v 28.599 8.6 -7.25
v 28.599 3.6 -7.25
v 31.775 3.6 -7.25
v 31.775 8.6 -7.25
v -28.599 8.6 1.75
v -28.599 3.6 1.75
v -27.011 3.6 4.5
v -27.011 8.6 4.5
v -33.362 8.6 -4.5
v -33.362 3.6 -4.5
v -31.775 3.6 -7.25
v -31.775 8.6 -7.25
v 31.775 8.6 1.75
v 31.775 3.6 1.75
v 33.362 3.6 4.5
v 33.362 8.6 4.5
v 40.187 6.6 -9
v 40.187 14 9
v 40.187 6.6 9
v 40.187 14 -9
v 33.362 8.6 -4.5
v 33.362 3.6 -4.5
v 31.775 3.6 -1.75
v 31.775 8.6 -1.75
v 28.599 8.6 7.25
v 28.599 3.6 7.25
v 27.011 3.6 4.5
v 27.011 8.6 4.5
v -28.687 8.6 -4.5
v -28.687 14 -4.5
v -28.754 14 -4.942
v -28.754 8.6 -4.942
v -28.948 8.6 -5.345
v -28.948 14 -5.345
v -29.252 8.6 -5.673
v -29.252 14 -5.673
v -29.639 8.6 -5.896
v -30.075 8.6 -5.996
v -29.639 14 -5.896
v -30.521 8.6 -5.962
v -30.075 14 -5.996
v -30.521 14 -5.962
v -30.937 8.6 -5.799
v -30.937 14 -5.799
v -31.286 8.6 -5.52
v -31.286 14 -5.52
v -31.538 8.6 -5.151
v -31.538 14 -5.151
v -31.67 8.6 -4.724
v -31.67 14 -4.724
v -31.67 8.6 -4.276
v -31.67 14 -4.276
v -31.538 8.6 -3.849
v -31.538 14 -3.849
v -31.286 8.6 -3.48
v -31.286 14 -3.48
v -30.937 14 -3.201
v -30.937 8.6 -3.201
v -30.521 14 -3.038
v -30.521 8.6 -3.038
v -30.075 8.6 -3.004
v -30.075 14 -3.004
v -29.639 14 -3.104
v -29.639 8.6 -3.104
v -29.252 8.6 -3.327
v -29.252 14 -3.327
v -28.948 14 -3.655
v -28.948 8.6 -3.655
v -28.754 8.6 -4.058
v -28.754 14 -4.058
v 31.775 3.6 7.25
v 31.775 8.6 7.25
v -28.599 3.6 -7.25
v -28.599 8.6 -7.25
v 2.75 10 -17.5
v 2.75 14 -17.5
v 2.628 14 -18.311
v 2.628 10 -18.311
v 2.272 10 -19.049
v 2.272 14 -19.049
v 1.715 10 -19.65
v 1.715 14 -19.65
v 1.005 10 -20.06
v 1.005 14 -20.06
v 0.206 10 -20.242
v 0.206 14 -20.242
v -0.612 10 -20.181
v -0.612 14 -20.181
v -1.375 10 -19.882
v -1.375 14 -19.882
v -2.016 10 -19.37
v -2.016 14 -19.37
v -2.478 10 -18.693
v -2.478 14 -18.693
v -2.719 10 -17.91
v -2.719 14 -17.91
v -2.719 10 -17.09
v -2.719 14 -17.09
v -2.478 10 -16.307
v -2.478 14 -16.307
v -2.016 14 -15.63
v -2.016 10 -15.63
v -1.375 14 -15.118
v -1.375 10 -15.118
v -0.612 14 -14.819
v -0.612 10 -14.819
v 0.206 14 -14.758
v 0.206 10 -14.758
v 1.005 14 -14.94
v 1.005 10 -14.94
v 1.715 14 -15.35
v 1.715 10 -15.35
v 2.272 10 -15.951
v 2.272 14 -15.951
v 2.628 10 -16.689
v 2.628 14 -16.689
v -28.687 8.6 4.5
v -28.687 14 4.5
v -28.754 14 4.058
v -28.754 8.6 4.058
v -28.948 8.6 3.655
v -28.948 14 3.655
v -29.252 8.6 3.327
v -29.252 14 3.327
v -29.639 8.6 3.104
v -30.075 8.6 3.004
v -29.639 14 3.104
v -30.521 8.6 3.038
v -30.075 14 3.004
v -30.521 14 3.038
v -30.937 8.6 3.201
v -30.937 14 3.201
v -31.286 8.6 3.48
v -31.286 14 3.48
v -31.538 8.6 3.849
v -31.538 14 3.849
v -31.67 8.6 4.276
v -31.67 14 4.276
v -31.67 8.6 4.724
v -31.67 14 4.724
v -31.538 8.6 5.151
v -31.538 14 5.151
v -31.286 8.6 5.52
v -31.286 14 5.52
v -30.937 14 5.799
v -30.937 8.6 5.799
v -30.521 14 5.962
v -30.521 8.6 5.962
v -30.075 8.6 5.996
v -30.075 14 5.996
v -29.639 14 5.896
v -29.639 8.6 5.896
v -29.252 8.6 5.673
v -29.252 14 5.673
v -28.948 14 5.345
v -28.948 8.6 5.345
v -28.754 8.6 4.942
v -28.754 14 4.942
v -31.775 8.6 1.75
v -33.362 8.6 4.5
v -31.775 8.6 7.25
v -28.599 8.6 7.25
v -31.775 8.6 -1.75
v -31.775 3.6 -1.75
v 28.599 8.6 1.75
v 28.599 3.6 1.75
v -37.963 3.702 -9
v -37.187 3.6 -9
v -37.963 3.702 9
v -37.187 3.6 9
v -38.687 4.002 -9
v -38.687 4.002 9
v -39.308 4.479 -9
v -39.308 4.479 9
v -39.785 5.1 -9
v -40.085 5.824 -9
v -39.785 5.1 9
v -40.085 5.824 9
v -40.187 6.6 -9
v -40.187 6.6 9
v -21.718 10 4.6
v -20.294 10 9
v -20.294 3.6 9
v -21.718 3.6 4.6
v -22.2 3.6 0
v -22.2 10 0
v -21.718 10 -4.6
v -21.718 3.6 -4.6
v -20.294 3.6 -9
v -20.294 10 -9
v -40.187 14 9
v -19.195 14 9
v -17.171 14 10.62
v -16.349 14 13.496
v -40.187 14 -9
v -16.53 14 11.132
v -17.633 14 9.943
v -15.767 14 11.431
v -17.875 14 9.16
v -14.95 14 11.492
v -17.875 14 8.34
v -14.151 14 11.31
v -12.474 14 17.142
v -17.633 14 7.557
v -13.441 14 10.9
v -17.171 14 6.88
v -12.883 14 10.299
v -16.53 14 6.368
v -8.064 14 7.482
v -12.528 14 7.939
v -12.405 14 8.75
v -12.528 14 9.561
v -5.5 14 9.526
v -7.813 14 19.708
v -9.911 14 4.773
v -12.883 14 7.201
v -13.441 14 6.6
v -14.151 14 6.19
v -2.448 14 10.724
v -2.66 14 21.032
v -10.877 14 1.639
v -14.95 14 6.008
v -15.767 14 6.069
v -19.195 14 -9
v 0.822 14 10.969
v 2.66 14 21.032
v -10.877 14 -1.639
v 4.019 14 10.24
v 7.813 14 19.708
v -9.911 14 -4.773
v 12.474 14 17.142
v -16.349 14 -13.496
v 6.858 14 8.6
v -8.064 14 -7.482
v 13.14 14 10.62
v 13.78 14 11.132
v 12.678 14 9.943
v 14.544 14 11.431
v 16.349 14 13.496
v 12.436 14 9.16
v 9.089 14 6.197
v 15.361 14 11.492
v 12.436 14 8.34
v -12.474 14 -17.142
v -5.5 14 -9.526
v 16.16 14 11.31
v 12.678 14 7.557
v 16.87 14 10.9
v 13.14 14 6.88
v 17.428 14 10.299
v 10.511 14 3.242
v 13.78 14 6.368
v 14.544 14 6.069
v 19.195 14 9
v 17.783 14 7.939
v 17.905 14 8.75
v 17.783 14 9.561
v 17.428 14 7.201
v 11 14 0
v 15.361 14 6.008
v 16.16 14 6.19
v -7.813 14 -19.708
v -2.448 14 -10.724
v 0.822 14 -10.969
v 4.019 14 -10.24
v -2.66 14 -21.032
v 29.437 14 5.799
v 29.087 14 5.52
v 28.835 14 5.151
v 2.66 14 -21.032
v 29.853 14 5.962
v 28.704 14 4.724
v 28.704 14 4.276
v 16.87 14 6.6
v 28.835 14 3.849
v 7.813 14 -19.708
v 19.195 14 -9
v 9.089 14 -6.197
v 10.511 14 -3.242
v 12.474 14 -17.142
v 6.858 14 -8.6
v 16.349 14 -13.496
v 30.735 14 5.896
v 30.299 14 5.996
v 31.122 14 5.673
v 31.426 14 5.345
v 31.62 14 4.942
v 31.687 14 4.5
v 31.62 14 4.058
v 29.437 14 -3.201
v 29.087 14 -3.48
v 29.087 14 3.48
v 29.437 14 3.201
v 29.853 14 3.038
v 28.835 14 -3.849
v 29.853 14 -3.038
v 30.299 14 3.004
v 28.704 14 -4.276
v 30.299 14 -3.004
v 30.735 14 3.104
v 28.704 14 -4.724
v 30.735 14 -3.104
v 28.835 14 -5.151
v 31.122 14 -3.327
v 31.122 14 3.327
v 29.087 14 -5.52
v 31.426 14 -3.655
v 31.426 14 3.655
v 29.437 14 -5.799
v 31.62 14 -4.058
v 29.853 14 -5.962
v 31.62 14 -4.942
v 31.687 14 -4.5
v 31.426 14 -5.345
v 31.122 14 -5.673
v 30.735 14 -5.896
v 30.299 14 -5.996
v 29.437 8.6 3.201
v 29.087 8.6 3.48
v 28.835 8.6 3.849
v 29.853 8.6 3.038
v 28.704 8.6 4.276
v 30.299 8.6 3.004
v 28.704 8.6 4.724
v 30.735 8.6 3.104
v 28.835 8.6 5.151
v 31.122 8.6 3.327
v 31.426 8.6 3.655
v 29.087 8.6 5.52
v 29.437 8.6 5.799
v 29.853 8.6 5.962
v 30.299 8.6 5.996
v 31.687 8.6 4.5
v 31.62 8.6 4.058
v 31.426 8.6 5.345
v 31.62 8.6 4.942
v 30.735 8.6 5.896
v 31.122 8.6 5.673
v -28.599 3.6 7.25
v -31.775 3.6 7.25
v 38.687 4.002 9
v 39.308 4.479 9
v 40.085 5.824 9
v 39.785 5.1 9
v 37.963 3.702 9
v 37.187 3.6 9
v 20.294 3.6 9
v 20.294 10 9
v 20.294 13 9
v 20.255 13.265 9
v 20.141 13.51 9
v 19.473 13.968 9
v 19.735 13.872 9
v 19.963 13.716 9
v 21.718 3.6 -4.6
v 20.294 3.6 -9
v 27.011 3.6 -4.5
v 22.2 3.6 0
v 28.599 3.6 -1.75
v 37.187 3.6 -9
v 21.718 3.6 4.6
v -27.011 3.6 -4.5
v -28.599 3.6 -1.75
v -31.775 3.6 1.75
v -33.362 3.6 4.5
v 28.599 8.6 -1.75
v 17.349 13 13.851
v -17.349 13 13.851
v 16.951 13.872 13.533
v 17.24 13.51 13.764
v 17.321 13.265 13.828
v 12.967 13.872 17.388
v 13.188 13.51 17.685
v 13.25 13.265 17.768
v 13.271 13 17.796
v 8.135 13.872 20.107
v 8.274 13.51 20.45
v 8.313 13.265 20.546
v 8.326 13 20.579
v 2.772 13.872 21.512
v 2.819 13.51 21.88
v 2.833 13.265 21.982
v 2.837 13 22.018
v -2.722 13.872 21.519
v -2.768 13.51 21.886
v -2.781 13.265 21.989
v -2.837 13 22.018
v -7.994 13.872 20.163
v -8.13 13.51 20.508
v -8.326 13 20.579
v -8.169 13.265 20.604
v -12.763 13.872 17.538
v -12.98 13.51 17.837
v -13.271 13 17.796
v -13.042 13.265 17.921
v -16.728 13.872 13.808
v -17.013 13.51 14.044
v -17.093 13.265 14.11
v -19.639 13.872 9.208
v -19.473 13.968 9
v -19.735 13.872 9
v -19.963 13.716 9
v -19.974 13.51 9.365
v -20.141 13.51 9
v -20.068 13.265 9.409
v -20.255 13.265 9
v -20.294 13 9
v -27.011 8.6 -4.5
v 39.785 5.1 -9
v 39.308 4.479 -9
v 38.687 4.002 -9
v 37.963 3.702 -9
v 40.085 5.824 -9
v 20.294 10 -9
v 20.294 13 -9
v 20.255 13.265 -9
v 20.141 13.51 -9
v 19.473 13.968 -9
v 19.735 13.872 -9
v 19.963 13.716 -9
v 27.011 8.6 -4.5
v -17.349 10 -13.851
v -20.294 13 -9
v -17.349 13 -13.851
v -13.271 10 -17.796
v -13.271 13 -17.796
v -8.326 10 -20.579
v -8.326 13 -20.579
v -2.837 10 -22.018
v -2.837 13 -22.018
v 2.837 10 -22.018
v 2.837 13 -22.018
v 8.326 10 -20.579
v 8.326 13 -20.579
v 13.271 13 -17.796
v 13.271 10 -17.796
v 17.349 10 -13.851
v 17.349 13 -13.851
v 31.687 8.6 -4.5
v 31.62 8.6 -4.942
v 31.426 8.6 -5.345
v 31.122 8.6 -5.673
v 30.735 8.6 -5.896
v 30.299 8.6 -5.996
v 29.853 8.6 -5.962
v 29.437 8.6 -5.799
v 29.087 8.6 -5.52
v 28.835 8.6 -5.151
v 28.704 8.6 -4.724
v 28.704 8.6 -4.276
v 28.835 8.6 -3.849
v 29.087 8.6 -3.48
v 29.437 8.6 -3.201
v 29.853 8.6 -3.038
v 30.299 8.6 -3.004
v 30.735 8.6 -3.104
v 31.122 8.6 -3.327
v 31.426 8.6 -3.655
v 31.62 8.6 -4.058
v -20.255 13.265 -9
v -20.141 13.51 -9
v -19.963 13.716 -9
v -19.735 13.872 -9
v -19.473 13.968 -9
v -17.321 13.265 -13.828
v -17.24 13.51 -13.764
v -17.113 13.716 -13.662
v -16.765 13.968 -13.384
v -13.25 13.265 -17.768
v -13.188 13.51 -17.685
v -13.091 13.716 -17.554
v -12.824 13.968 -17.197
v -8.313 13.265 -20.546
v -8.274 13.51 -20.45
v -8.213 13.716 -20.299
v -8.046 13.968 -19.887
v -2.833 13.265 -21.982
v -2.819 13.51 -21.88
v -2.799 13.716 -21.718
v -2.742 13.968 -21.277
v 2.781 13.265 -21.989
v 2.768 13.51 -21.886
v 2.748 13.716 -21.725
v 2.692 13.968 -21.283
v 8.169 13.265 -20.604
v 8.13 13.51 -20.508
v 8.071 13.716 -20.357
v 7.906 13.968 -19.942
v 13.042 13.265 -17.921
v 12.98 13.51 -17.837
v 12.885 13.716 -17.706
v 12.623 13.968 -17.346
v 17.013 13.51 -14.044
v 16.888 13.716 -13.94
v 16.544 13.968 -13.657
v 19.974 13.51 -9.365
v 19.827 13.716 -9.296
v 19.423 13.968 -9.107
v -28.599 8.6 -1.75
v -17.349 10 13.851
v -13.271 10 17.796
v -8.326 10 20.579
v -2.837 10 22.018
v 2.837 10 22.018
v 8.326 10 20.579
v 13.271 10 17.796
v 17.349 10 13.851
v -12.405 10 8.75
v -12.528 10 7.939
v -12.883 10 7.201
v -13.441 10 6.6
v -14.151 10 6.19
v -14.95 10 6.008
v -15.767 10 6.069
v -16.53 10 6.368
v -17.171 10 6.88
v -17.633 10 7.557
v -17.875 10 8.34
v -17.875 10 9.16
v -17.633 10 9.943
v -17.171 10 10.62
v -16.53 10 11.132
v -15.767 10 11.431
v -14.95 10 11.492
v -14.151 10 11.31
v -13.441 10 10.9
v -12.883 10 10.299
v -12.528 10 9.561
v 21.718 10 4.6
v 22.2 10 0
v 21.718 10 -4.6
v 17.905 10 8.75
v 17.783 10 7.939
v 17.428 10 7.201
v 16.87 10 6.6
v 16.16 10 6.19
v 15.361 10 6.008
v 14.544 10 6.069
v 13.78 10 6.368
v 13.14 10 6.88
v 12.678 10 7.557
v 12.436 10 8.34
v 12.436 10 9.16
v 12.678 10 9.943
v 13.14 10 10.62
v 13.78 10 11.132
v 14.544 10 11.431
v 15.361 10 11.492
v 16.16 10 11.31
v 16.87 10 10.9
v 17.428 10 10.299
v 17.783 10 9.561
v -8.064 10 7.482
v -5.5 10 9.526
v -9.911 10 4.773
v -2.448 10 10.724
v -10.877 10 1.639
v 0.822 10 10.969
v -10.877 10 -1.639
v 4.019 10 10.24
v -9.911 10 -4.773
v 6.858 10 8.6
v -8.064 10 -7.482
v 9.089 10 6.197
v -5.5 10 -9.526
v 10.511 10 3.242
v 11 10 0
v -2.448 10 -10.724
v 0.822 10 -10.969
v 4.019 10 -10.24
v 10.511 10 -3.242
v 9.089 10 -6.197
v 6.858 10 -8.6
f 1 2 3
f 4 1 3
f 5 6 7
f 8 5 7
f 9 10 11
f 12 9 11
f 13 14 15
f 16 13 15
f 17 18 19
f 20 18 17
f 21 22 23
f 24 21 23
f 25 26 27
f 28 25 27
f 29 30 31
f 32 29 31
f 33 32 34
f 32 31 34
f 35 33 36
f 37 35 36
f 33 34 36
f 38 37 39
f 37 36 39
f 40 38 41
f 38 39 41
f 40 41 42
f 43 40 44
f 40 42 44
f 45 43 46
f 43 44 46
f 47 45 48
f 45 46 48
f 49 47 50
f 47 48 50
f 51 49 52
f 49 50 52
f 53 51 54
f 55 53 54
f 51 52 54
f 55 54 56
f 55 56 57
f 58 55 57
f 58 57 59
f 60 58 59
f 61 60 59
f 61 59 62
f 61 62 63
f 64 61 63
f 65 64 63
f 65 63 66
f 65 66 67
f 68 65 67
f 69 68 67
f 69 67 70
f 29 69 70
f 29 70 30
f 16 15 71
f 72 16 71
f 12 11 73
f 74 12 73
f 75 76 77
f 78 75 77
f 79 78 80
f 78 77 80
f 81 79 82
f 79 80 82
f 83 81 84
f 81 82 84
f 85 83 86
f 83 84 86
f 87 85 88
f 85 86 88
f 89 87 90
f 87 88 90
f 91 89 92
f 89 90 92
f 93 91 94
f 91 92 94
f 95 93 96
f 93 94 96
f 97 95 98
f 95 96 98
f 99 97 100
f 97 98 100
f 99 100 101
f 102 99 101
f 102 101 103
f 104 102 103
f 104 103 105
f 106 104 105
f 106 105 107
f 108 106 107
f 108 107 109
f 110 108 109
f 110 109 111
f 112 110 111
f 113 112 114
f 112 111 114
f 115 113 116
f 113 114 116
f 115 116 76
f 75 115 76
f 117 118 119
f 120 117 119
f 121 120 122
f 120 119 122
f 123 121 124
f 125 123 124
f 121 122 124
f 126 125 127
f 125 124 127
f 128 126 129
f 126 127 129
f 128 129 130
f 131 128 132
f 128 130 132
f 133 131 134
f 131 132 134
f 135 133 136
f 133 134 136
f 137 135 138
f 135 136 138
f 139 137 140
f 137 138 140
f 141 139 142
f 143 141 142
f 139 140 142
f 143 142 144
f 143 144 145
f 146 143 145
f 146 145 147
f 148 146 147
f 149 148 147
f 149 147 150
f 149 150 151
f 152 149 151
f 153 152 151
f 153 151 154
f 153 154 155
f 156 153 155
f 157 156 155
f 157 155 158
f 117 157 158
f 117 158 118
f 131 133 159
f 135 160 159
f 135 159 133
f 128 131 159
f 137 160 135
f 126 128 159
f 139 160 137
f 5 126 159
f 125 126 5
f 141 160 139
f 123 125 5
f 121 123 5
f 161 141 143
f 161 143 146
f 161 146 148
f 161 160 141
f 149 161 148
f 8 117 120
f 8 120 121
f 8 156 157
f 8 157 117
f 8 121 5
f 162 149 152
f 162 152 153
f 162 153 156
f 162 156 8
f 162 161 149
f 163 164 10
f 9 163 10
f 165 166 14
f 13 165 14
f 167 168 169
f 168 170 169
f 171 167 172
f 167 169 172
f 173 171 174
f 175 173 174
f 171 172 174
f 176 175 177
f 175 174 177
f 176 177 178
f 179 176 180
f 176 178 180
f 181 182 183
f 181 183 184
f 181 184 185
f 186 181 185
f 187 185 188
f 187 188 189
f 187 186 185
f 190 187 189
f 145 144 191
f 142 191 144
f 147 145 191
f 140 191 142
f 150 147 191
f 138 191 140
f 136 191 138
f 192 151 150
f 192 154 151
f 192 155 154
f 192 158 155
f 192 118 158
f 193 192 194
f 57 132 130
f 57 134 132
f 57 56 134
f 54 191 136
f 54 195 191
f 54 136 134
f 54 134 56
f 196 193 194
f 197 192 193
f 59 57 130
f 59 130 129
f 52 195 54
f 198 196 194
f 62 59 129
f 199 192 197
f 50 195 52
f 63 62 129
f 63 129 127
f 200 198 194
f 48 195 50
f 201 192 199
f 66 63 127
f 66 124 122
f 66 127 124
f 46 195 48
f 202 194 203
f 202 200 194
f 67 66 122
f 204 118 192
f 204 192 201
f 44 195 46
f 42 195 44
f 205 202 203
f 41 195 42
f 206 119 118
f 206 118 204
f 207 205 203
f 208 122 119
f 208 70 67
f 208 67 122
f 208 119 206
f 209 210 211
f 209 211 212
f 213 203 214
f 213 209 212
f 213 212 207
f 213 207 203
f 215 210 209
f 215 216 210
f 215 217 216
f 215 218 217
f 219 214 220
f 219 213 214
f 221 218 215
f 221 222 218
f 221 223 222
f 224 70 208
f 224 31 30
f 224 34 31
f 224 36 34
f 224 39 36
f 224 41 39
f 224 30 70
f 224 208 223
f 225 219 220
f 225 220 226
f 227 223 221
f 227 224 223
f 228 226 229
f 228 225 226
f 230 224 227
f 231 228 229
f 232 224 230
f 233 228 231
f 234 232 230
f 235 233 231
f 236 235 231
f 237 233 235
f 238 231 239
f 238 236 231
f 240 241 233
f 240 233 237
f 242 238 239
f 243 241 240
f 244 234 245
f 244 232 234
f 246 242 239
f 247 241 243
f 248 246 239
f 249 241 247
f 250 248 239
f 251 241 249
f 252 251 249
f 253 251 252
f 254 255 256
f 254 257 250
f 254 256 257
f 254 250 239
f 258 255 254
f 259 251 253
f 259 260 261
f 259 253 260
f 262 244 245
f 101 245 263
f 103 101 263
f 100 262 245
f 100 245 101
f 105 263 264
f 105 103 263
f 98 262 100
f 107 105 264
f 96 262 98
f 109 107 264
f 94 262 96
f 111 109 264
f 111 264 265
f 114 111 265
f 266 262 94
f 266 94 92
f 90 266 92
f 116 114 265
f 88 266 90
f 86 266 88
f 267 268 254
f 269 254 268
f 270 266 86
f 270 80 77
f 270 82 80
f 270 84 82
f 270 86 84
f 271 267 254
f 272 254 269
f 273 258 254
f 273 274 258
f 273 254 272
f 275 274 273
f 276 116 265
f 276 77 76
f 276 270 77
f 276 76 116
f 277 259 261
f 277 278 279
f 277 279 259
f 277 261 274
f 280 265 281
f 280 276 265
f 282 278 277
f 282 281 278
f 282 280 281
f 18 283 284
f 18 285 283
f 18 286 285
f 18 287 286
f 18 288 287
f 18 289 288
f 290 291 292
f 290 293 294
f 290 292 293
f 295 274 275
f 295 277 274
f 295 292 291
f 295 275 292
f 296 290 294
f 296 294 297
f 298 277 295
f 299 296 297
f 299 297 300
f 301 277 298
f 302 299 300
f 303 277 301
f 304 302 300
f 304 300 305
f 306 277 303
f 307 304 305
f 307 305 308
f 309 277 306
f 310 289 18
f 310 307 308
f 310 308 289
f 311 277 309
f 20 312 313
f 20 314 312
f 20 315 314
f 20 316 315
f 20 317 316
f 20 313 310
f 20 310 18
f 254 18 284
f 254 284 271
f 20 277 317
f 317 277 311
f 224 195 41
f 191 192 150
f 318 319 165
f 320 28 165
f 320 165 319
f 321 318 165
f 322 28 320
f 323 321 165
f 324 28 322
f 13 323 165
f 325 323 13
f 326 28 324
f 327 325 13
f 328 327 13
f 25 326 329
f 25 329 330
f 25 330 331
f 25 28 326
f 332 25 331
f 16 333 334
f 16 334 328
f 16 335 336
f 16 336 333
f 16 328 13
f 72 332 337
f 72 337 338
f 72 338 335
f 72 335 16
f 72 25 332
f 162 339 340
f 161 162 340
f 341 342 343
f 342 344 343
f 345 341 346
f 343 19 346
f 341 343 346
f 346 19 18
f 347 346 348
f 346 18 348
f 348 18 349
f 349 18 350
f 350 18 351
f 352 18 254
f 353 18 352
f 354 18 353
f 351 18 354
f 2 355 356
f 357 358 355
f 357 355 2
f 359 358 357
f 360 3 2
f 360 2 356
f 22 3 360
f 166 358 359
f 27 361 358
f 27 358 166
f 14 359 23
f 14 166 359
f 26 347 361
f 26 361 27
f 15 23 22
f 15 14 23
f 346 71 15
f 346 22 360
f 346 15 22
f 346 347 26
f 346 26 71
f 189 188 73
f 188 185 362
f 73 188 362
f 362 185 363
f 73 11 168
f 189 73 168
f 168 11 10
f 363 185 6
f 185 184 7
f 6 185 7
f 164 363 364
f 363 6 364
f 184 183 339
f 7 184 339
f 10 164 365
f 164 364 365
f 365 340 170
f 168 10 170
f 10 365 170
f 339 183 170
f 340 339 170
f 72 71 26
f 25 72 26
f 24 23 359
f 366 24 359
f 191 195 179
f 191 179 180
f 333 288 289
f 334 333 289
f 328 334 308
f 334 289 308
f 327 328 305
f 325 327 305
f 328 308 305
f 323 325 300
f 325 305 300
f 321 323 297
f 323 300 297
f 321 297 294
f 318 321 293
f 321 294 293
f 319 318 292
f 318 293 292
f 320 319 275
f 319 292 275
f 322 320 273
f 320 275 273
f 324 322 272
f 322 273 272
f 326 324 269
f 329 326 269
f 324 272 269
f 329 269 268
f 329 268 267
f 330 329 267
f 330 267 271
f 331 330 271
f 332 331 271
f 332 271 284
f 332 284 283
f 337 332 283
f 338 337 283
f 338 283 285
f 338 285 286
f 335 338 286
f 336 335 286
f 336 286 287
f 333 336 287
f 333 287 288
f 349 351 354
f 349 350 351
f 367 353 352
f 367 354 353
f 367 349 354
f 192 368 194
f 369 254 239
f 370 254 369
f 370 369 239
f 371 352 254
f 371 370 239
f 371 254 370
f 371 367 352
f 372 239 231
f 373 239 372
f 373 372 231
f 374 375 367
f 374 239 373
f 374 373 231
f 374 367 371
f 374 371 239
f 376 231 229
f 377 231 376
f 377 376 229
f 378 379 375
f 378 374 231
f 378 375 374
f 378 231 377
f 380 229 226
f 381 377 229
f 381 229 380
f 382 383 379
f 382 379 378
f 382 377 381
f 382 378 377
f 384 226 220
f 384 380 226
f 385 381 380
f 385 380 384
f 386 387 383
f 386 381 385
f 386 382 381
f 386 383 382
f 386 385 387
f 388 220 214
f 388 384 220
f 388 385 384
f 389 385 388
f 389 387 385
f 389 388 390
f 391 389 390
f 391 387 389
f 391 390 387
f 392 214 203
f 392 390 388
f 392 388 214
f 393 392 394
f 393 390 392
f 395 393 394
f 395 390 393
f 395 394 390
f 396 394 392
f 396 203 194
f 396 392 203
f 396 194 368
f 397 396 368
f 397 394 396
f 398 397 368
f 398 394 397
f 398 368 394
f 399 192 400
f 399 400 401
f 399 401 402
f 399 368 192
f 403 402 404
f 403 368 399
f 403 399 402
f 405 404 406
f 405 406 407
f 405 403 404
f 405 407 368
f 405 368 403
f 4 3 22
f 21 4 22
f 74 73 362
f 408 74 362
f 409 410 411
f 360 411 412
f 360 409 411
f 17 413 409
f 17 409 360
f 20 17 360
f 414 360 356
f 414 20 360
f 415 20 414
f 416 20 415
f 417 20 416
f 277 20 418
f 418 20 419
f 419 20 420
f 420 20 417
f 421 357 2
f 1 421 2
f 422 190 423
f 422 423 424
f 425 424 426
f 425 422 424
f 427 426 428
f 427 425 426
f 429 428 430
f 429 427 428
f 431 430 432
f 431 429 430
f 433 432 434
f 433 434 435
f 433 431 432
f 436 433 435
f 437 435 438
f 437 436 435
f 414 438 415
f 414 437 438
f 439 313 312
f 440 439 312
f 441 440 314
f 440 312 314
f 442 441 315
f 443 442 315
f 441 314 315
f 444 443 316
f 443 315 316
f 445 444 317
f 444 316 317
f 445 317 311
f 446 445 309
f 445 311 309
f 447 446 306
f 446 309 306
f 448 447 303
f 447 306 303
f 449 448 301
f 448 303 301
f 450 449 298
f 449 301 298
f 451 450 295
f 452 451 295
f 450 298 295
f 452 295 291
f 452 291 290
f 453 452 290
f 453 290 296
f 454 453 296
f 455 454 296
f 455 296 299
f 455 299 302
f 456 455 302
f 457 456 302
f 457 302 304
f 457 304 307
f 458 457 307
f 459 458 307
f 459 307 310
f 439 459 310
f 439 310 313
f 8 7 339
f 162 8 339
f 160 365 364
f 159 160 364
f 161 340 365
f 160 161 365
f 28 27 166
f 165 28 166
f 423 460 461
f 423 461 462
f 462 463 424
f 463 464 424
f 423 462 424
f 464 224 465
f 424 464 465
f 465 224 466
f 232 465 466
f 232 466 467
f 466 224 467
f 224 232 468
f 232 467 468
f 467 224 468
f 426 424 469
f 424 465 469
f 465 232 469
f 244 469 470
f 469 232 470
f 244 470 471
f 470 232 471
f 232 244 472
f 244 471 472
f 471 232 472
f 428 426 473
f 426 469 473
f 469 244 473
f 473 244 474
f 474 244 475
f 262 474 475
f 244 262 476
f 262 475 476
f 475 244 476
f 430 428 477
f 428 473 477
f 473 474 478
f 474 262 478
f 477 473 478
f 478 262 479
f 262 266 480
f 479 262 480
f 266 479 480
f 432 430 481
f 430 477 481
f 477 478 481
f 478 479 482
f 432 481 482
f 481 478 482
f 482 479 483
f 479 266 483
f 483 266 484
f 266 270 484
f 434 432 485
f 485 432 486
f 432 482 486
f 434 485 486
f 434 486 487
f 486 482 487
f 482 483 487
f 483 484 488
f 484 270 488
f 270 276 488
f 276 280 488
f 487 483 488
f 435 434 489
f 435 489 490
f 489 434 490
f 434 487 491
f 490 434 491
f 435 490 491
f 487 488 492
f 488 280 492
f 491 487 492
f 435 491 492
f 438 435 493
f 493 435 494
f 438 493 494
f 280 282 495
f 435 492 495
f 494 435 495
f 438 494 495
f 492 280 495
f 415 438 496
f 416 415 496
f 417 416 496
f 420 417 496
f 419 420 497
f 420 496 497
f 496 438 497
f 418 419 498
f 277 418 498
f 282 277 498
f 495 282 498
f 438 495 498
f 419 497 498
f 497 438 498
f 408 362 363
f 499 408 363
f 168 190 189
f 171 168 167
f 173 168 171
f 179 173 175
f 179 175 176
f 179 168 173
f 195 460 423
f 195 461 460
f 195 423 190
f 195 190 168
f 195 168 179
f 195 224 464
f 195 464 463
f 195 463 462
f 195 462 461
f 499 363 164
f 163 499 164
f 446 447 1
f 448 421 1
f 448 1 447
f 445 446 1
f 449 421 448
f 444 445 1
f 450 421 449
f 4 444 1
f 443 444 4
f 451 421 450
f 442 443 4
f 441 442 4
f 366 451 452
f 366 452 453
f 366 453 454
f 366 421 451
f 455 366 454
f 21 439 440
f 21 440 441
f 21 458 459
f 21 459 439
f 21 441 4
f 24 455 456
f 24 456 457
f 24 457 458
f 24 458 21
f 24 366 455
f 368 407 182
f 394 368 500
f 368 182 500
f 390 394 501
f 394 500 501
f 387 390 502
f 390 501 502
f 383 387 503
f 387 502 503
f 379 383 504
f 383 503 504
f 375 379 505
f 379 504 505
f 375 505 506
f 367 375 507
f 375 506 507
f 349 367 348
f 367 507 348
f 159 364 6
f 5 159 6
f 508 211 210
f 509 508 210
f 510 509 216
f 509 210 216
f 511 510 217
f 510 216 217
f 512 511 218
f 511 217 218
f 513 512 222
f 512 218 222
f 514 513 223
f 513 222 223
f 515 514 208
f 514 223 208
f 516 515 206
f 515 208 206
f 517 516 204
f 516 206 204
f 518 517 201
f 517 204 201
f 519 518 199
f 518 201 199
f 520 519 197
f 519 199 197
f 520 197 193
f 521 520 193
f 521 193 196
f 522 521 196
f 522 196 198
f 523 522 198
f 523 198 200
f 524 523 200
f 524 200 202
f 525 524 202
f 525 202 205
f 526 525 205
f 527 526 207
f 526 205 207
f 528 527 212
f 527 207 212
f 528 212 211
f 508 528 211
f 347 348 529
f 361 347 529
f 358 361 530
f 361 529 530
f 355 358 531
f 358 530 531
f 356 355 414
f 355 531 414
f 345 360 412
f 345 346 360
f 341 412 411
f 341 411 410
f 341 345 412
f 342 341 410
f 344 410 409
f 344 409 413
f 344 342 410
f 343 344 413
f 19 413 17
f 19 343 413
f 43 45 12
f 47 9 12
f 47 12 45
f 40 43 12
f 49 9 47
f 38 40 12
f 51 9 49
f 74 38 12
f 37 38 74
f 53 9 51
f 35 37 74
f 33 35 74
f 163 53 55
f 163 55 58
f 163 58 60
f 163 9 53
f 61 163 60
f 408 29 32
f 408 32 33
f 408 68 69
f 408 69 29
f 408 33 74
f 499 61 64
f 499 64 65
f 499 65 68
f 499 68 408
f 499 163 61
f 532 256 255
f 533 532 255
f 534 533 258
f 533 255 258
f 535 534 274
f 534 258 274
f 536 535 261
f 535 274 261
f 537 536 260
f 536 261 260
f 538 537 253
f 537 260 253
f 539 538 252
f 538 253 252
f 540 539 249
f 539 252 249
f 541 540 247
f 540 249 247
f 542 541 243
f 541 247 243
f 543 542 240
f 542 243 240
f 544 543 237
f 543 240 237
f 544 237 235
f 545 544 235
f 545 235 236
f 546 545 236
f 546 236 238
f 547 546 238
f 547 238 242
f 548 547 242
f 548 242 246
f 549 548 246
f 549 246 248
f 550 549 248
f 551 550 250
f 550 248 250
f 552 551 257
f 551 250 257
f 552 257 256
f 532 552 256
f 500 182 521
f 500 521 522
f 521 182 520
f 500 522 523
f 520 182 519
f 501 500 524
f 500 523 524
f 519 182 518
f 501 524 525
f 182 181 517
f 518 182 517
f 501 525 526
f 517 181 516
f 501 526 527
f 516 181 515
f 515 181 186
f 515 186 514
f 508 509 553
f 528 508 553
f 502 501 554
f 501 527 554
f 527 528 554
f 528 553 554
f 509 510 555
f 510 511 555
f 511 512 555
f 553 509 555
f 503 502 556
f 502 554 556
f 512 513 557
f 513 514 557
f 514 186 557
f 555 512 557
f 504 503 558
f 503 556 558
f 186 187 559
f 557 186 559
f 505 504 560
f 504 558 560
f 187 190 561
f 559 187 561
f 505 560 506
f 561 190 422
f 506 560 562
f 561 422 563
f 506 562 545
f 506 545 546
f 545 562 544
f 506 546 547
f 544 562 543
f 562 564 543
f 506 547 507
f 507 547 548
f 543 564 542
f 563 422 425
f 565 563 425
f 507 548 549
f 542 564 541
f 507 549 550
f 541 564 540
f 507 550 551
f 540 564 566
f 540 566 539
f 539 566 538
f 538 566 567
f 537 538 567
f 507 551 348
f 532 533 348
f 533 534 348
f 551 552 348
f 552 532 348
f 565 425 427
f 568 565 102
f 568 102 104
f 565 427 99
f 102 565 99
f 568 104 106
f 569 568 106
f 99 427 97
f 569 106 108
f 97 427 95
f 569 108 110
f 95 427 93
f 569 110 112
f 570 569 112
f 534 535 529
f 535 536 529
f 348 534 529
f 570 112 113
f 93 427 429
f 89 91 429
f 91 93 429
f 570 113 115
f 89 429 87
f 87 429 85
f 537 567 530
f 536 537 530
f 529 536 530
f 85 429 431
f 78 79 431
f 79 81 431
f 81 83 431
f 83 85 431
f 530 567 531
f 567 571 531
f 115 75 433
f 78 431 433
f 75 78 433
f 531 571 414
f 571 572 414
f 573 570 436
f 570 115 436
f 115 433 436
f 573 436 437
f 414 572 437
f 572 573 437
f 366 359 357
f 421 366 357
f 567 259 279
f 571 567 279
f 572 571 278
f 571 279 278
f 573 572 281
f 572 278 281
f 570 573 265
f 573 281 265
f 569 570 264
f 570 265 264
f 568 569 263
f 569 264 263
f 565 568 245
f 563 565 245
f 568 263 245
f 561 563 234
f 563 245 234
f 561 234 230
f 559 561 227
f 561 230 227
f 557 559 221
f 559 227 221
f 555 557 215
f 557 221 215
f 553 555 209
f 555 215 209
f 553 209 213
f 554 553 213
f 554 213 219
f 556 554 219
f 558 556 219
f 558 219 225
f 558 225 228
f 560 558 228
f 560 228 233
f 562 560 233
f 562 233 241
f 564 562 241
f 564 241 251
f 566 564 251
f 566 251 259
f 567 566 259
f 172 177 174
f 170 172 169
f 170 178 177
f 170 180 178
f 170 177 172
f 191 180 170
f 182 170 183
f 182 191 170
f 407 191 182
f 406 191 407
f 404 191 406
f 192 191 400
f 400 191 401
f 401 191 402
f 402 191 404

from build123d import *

# Parameters (mm, degrees)
SKETCH1_R                = 17.45
SKETCH1_R_2              = 12.45
BOSS_EXTRUDE1_DEPTH      = 8
SKETCH2_R                = 20
SKETCH2_R_2              = 12.45
BOSS_EXTRUDE2_DEPTH      = 2
SKETCH3_R                = 32.5
SKETCH3_R_2              = 12.45
BOSS_EXTRUDE3_DEPTH      = 4
FILLET1_R                = 1
BOSS_EXTRUDE6_START      = -4
SKETCH10_W               = 10
SKETCH10_H               = 18
BOSS_EXTRUDE6_DEPTH      = 4
SKETCH4_W                = 6
SKETCH4_H                = 18
BOSS_EXTRUDE4_DEPTH      = 75
BOSS_EXTRUDE4_DEPTH_BACK = 4
SKETCH5_R                = 5.05
CUT_EXTRUDE1_DEPTH       = 306
CUT_EXTRUDE1_DEPTH_BACK  = 113
SKETCH6_W                = 6
SKETCH6_H                = 10
BOSS_EXTRUDE5_DEPTH      = 15
BOSS_EXTRUDE5_DEPTH_BACK = 32.85
SKETCH7_R                = 1.629220746
SKETCH7_R_2              = 1.580258945
CUT_EXTRUDE2_DEPTH       = 10
SKETCH9_R                = 5.05
CUT_EXTRUDE3_DEPTH       = 10
CUT_EXTRUDE3_DEPTH_BACK  = 10
SKETCH11_W               = 9.782596874
SKETCH11_H               = 3.234517514
CUT_EXTRUDE4_DEPTH       = 123
CUT_EXTRUDE4_DEPTH_BACK  = 61
FILLET4_R                = 3
FILLET5_R                = 3
SKETCH12_W               = 108.791398151
SKETCH12_H               = 24.041848298
CUT_EXTRUDE5_DEPTH       = 110.678
SKETCH15_R               = 22
CUT_EXTRUDE7_DEPTH       = 4
SKETCH13_R               = 22
SKETCH13_R_2             = 11
SKETCH13_R_3             = 2.75
BOSS_EXTRUDE7_DEPTH      = 4
FILLET6_R                = 3
CUT_EXTRUDE8_DEPTH       = 5
FILLET7_R                = 1
BOSS_EXTRUDE8_START      = -3
BOSS_EXTRUDE8_DEPTH      = 9.4
FILLET8_R                = 3
FILLET8_OF_MIRROR2_R     = 3
CUT_EXTRUDE12_START      = -6
SKETCH21_R               = 6.05
CUT_EXTRUDE12_DEPTH      = 3.8
SKETCH18_W               = 88.746975794
SKETCH18_H               = 20.386854219
CUT_EXTRUDE9_DEPTH       = 10
SKETCH19_W               = 6
SKETCH19_H               = 10.45
BOSS_EXTRUDE9_DEPTH      = 5
FILLET9_R                = 2
CUT_EXTRUDE13_DEPTH      = 2
SKETCH23_R               = 1
CUT_EXTRUDE14_DEPTH      = 11
CUT_EXTRUDE16_DEPTH      = 1.7
SKETCH26_W               = 136.459260558
SKETCH26_H               = 86.542262852
CUT_EXTRUDE17_DEPTH      = 100
CUT_EXTRUDE17_DEPTH_BACK = 100
SKETCH27_R               = 1.5
CUT_EXTRUDE18_DEPTH      = 100
CUT_EXTRUDE19_DEPTH      = 5


with BuildPart() as part:
    # Sketch1 → Boss-Extrude1 (new body)
    with BuildSketch(Plane(origin=(0, 0, 0), x_dir=(1, 0, 0), z_dir=(0, 1, 0))):
        Circle(SKETCH1_R)
        Circle(SKETCH1_R_2, mode=Mode.SUBTRACT)
    extrude(amount=BOSS_EXTRUDE1_DEPTH)

    # Sketch2 → Boss-Extrude2 (add)
    with BuildSketch(Plane(origin=(0, 8, 0), x_dir=(1, 0, 0), z_dir=(0, 1, 0))):
        Circle(SKETCH2_R)
        Circle(SKETCH2_R_2, mode=Mode.SUBTRACT)
    extrude(amount=BOSS_EXTRUDE2_DEPTH)

    # Sketch3 → Boss-Extrude3 (add)
    with BuildSketch(Plane(origin=(0, 10, 0), x_dir=(1, 0, 0), z_dir=(0, 1, 0))):
        Circle(SKETCH3_R)
        Circle(SKETCH3_R_2, mode=Mode.SUBTRACT)
    extrude(amount=BOSS_EXTRUDE3_DEPTH)

    # Fillet1
    fillet1_edges = [part.edges().sort_by_distance(p)[0] for p in [
        (-32.5, 14, 0),
    ]]
    fillet(fillet1_edges, radius=FILLET1_R)

    # Sketch10 → Boss-Extrude6 (add)
    with BuildSketch(Plane(origin=(0, 14, 0), x_dir=(1, 0, 0), z_dir=(0, 1, 0)).offset(BOSS_EXTRUDE6_START)):
        with Locations((35.186917696, 0)):
            Rectangle(SKETCH10_W, SKETCH10_H)
        with Locations((-35.186917696, 0)):
            Rectangle(SKETCH10_W, SKETCH10_H)
    extrude(amount=BOSS_EXTRUDE6_DEPTH)

    # Sketch4 → Boss-Extrude4 (add, two sides)
    with BuildSketch(Plane(origin=(0, 14, 0), x_dir=(1, 0, 0), z_dir=(0, 1, 0))) as boss_extrude4_sk:
        with Locations((-37.186917696, 0)):
            Rectangle(SKETCH4_W, SKETCH4_H)
        with Locations((37.186917696, 0)):
            Rectangle(SKETCH4_W, SKETCH4_H)
    extrude(amount=BOSS_EXTRUDE4_DEPTH)
    extrude(boss_extrude4_sk.sketch, amount=-BOSS_EXTRUDE4_DEPTH_BACK)

    # Sketch5 → Cut-Extrude1 (cut, two sides)
    with BuildSketch(Plane.ZY.offset(-34.186917696)) as cut_extrude1_sk:
        with Locations((0, 79)):
            Circle(SKETCH5_R)
    extrude(amount=CUT_EXTRUDE1_DEPTH, mode=Mode.SUBTRACT)
    extrude(cut_extrude1_sk.sketch, amount=-CUT_EXTRUDE1_DEPTH_BACK, mode=Mode.SUBTRACT)

    # Sketch6 → Boss-Extrude5 (add, two sides)
    with BuildSketch(Plane(origin=(0, 0, -9), x_dir=(-1, 0, 0), z_dir=(0, 0, -1))) as boss_extrude5_sk:
        with Locations((37.186917696, 70.95)):
            Rectangle(SKETCH6_W, SKETCH6_H)
    extrude(amount=BOSS_EXTRUDE5_DEPTH)
    extrude(boss_extrude5_sk.sketch, amount=-BOSS_EXTRUDE5_DEPTH_BACK)

    # Sketch7 → Cut-Extrude2 (cut)
    with BuildSketch(Plane(origin=(-34.186917696, 0, 0), x_dir=(0, 0, -1), z_dir=(1, 0, 0))):
        with Locations((-17.5, 71)):
            Circle(SKETCH7_R)
        with Locations((17.5, 71)):
            Circle(SKETCH7_R_2)
    extrude(amount=-CUT_EXTRUDE2_DEPTH, mode=Mode.SUBTRACT)

    # Sketch9 → Cut-Extrude3 (cut, two sides)
    with BuildSketch(Plane(origin=(-34.186917696, 0, 0), x_dir=(0, 0, -1), z_dir=(1, 0, 0))) as cut_extrude3_sk:
        with Locations((0, 79)):
            Circle(SKETCH9_R)
    extrude(amount=CUT_EXTRUDE3_DEPTH, mode=Mode.SUBTRACT)
    extrude(cut_extrude3_sk.sketch, amount=-CUT_EXTRUDE3_DEPTH_BACK, mode=Mode.SUBTRACT)

    # Sketch11 → Cut-Extrude4 (cut, two sides)
    with BuildSketch(Plane.ZY.offset(-34.186917696)) as cut_extrude4_sk:
        with Locations((0, 15.617258757)):
            Rectangle(SKETCH11_W, SKETCH11_H)
    extrude(amount=CUT_EXTRUDE4_DEPTH, mode=Mode.SUBTRACT)
    extrude(cut_extrude4_sk.sketch, amount=-CUT_EXTRUDE4_DEPTH_BACK, mode=Mode.SUBTRACT)

    # Fillet4
    fillet4_edges = [part.edges().sort_by_distance(p)[0] for p in [
        (-37.186917696, 65.95, 23.85),
        (-37.186917696, 75.95, 23.85),
        (-37.186917696, 65.95, -24),
        (-37.186917696, 75.95, -24),
        (-37.186917696, 89, -9),
        (-37.186917696, 89, 9),
    ]]
    fillet(fillet4_edges, radius=FILLET4_R)

    # Fillet5
    fillet5_edges = [part.edges().sort_by_distance(p)[0] for p in [
        (40.186917696, 10, 0),
        (-40.186917696, 10, 0),
    ]]
    fillet(fillet5_edges, radius=FILLET5_R)

    # Sketch12 → Cut-Extrude5 (cut)
    with BuildSketch(Plane(origin=(40.186917696, 0, 0), x_dir=(0, 0, -1), z_dir=(1, 0, 0))):
        with Locations((-12.502918017, -2.020924149)):
            Rectangle(SKETCH12_W, SKETCH12_H)
    extrude(amount=-CUT_EXTRUDE5_DEPTH, mode=Mode.SUBTRACT)

    # Sketch15 → Cut-Extrude7 (cut)
    with BuildSketch(Plane(origin=(0, 14, 0), x_dir=(1, 0, 0), z_dir=(0, 1, 0))):
        Circle(SKETCH15_R)
    extrude(amount=-CUT_EXTRUDE7_DEPTH, mode=Mode.SUBTRACT)

    # Sketch13 → Boss-Extrude7 (add)
    with BuildSketch(Plane(origin=(0, 14, 0), x_dir=(1, 0, 0), z_dir=(0, 1, 0))):
        Circle(SKETCH13_R)
        Circle(SKETCH13_R_2, mode=Mode.SUBTRACT)
        with Locations((0, 17.5)):
            Circle(SKETCH13_R_3, mode=Mode.SUBTRACT)
        with Locations((-15.155444566, -8.75)):
            Circle(SKETCH13_R_3, mode=Mode.SUBTRACT)
        with Locations((15.155444566, -8.75)):
            Circle(SKETCH13_R_3, mode=Mode.SUBTRACT)
    extrude(amount=-BOSS_EXTRUDE7_DEPTH)

    # Fillet6
    fillet6_edges = [part.edges().sort_by_distance(p)[0] for p in [
        (37.186917696, 89, 9),
        (37.186917696, 89, -9),
    ]]
    fillet(fillet6_edges, radius=FILLET6_R)

    # Sketch16 → Cut-Extrude8 (cut)
    with BuildSketch(Plane.XZ.offset(-10)):
        with BuildLine():
            Line((-31.228992939, 9), (-20.29384143, 9))
            ThreePointArc((-20.29384143, 9), (0, 22.2), (20.29384143, 9))
            Line((20.29384143, 9), (31.228992939, 9))
            ThreePointArc((31.228992939, 9), (0, 32.5), (-31.228992939, 9))
        make_face()
    cut_extrude8 = extrude(amount=-CUT_EXTRUDE8_DEPTH, mode=Mode.SUBTRACT)

    # Mirror1: Cut-Extrude8 across plane
    add(cut_extrude8.mirror(Plane.XY), mode=Mode.SUBTRACT)

    # Fillet7
    fillet7_edges = [part.edges().sort_by_distance(p)[0] for p in [
        (0, 14, 22.2),
        (0, 14, -22.2),
    ]]
    fillet(fillet7_edges, radius=FILLET7_R)

    # Sketch17 → Boss-Extrude8 (add)
    with BuildSketch(Plane.XZ.offset(-10).offset(BOSS_EXTRUDE8_START)):
        with BuildLine():
            Line((20.29384143, -9), (40.186917696, -9))
            Line((40.186917696, -9), (40.186917696, 9))
            Line((40.186917696, 9), (20.29384143, 9))
            ThreePointArc((20.29384143, 9), (22.2, 0), (20.29384143, -9))
        make_face()
    boss_extrude8 = extrude(amount=BOSS_EXTRUDE8_DEPTH)

    # Fillet8
    fillet8_edges = [part.edges().sort_by_distance(p)[0] for p in [
        (40.186917696, 3.6, 0),
    ]]
    fillet(fillet8_edges, radius=FILLET8_R)

    # Mirror2: Boss-Extrude8 across plane
    add(boss_extrude8.mirror(Plane(origin=(0, 0, 0), x_dir=(0, 0, 1), z_dir=(1, 0, 0))))

    # Fillet8 of Mirror2
    fillet8_of_mirror2_edges = [part.edges().sort_by_distance(p)[0] for p in [
        (-40.186917696, 3.6, 0),
    ]]
    fillet(fillet8_of_mirror2_edges, radius=FILLET8_OF_MIRROR2_R)

    # Sketch21 → Cut-Extrude12 (cut)
    with BuildSketch(Plane(origin=(40.186917696, 0, 0), x_dir=(0, 0, -1), z_dir=(1, 0, 0)).offset(CUT_EXTRUDE12_START)):
        with Locations((0, 79)):
            Circle(SKETCH21_R)
    extrude(amount=CUT_EXTRUDE12_DEPTH, mode=Mode.SUBTRACT)

    # Sketch18 → Cut-Extrude9 (cut)
    with BuildSketch(Plane(origin=(40.186917696, 0, 0), x_dir=(0, 0, -1), z_dir=(1, 0, 0))):
        with Locations((0, 89.193427109)):
            Rectangle(SKETCH18_W, SKETCH18_H)
    extrude(amount=-CUT_EXTRUDE9_DEPTH, mode=Mode.SUBTRACT)

    # Sketch19 → Boss-Extrude9 (add)
    with BuildSketch(Plane(origin=(0, 79, 0), x_dir=(1, 0, 0), z_dir=(0, 1, 0))):
        with Locations((37.186917696, -11.275)):
            Rectangle(SKETCH19_W, SKETCH19_H)
        with Locations((37.186917696, 11.275)):
            Rectangle(SKETCH19_W, SKETCH19_H)
    extrude(amount=-BOSS_EXTRUDE9_DEPTH)

    # Fillet9
    fillet9_edges = [part.edges().sort_by_distance(p)[0] for p in [
        (37.186917696, 74, 16.5),
        (37.186917696, 74, -16.5),
    ]]
    fillet(fillet9_edges, radius=FILLET9_R)

    # Sketch22 → Cut-Extrude13 (cut)
    with BuildSketch(Plane(origin=(-34.186917696, 0, 0), x_dir=(0, 0, -1), z_dir=(1, 0, 0))):
        Polygon((-15.9988893, 68.4), (-14.4977786, 71), (-15.9988893, 73.6), (-19.0011107, 73.6), (-20.5022214, 71), (-19.0011107, 68.4), align=None)
        Polygon((20.5022214, 71), (19.0011107, 73.6), (15.9988893, 73.6), (14.4977786, 71), (15.9988893, 68.4), (19.0011107, 68.4), align=None)
    extrude(amount=-CUT_EXTRUDE13_DEPTH, mode=Mode.SUBTRACT)

    # Sketch23 → Cut-Extrude14 (cut)
    with BuildSketch(Plane(origin=(0, 79, 0), x_dir=(1, 0, 0), z_dir=(0, 1, 0))):
        with Locations((37.186917696, -12.3)):
            Circle(SKETCH23_R)
        with Locations((37.186917696, 12.3)):
            Circle(SKETCH23_R)
    extrude(amount=-CUT_EXTRUDE14_DEPTH, mode=Mode.SUBTRACT)

    # Sketch24 → Cut-Extrude16 (cut)
    with BuildSketch(Plane.XZ.offset(-74)):
        Polygon((37.186917696, 9.990598923), (39.186917696, 11.145299462), (39.186917696, 13.454700538), (37.186917696, 14.609401077), (35.186917696, 13.454700538), (35.186917696, 11.145299462), align=None)
        Polygon((37.186917696, -14.609401077), (39.186917696, -13.454700538), (39.186917696, -11.145299462), (37.186917696, -9.990598923), (35.186917696, -11.145299462), (35.186917696, -13.454700538), align=None)
    extrude(amount=-CUT_EXTRUDE16_DEPTH, mode=Mode.SUBTRACT)

    # Sketch26 → Cut-Extrude17 (cut, two sides)
    with BuildSketch(Plane(origin=(0, 0, -9), x_dir=(-1, 0, 0), z_dir=(0, 0, -1))) as cut_extrude17_sk:
        with Locations((-1.263679096, 57.271131426)):
            Rectangle(SKETCH26_W, SKETCH26_H)
    extrude(amount=CUT_EXTRUDE17_DEPTH, mode=Mode.SUBTRACT)
    extrude(cut_extrude17_sk.sketch, amount=-CUT_EXTRUDE17_DEPTH_BACK, mode=Mode.SUBTRACT)

    # Sketch27 → Cut-Extrude18 (cut)
    with BuildSketch(Plane(origin=(0, 14, 0), x_dir=(1, 0, 0), z_dir=(0, 1, 0))):
        with Locations((30.186917696, -4.5)):
            Circle(SKETCH27_R)
        with Locations((30.186917696, 4.5)):
            Circle(SKETCH27_R)
        with Locations((-30.186917696, -4.5)):
            Circle(SKETCH27_R)
        with Locations((-30.186917696, 4.5)):
            Circle(SKETCH27_R)
    extrude(amount=-CUT_EXTRUDE18_DEPTH, mode=Mode.SUBTRACT)

    # Sketch28 → Cut-Extrude19 (cut)
    with BuildSketch(Plane.XZ.offset(-3.6)):
        Polygon((27.011491216, -4.5), (28.599204456, -7.25), (31.774630937, -7.25), (33.362344177, -4.5), (31.774630937, -1.75), (28.599204456, -1.75), align=None)
        Polygon((27.011491216, 4.5), (28.599204456, 1.75), (31.774630937, 1.75), (33.362344177, 4.5), (31.774630937, 7.25), (28.599204456, 7.25), align=None)
        Polygon((-33.362344177, 4.5), (-31.774630937, 1.75), (-28.599204456, 1.75), (-27.011491216, 4.5), (-28.599204456, 7.25), (-31.774630937, 7.25), align=None)
        Polygon((-33.362344177, -4.5), (-31.774630937, -7.25), (-28.599204456, -7.25), (-27.011491216, -4.5), (-28.599204456, -1.75), (-31.774630937, -1.75), align=None)
    extrude(amount=-CUT_EXTRUDE19_DEPTH, mode=Mode.SUBTRACT)


solid = part.part
